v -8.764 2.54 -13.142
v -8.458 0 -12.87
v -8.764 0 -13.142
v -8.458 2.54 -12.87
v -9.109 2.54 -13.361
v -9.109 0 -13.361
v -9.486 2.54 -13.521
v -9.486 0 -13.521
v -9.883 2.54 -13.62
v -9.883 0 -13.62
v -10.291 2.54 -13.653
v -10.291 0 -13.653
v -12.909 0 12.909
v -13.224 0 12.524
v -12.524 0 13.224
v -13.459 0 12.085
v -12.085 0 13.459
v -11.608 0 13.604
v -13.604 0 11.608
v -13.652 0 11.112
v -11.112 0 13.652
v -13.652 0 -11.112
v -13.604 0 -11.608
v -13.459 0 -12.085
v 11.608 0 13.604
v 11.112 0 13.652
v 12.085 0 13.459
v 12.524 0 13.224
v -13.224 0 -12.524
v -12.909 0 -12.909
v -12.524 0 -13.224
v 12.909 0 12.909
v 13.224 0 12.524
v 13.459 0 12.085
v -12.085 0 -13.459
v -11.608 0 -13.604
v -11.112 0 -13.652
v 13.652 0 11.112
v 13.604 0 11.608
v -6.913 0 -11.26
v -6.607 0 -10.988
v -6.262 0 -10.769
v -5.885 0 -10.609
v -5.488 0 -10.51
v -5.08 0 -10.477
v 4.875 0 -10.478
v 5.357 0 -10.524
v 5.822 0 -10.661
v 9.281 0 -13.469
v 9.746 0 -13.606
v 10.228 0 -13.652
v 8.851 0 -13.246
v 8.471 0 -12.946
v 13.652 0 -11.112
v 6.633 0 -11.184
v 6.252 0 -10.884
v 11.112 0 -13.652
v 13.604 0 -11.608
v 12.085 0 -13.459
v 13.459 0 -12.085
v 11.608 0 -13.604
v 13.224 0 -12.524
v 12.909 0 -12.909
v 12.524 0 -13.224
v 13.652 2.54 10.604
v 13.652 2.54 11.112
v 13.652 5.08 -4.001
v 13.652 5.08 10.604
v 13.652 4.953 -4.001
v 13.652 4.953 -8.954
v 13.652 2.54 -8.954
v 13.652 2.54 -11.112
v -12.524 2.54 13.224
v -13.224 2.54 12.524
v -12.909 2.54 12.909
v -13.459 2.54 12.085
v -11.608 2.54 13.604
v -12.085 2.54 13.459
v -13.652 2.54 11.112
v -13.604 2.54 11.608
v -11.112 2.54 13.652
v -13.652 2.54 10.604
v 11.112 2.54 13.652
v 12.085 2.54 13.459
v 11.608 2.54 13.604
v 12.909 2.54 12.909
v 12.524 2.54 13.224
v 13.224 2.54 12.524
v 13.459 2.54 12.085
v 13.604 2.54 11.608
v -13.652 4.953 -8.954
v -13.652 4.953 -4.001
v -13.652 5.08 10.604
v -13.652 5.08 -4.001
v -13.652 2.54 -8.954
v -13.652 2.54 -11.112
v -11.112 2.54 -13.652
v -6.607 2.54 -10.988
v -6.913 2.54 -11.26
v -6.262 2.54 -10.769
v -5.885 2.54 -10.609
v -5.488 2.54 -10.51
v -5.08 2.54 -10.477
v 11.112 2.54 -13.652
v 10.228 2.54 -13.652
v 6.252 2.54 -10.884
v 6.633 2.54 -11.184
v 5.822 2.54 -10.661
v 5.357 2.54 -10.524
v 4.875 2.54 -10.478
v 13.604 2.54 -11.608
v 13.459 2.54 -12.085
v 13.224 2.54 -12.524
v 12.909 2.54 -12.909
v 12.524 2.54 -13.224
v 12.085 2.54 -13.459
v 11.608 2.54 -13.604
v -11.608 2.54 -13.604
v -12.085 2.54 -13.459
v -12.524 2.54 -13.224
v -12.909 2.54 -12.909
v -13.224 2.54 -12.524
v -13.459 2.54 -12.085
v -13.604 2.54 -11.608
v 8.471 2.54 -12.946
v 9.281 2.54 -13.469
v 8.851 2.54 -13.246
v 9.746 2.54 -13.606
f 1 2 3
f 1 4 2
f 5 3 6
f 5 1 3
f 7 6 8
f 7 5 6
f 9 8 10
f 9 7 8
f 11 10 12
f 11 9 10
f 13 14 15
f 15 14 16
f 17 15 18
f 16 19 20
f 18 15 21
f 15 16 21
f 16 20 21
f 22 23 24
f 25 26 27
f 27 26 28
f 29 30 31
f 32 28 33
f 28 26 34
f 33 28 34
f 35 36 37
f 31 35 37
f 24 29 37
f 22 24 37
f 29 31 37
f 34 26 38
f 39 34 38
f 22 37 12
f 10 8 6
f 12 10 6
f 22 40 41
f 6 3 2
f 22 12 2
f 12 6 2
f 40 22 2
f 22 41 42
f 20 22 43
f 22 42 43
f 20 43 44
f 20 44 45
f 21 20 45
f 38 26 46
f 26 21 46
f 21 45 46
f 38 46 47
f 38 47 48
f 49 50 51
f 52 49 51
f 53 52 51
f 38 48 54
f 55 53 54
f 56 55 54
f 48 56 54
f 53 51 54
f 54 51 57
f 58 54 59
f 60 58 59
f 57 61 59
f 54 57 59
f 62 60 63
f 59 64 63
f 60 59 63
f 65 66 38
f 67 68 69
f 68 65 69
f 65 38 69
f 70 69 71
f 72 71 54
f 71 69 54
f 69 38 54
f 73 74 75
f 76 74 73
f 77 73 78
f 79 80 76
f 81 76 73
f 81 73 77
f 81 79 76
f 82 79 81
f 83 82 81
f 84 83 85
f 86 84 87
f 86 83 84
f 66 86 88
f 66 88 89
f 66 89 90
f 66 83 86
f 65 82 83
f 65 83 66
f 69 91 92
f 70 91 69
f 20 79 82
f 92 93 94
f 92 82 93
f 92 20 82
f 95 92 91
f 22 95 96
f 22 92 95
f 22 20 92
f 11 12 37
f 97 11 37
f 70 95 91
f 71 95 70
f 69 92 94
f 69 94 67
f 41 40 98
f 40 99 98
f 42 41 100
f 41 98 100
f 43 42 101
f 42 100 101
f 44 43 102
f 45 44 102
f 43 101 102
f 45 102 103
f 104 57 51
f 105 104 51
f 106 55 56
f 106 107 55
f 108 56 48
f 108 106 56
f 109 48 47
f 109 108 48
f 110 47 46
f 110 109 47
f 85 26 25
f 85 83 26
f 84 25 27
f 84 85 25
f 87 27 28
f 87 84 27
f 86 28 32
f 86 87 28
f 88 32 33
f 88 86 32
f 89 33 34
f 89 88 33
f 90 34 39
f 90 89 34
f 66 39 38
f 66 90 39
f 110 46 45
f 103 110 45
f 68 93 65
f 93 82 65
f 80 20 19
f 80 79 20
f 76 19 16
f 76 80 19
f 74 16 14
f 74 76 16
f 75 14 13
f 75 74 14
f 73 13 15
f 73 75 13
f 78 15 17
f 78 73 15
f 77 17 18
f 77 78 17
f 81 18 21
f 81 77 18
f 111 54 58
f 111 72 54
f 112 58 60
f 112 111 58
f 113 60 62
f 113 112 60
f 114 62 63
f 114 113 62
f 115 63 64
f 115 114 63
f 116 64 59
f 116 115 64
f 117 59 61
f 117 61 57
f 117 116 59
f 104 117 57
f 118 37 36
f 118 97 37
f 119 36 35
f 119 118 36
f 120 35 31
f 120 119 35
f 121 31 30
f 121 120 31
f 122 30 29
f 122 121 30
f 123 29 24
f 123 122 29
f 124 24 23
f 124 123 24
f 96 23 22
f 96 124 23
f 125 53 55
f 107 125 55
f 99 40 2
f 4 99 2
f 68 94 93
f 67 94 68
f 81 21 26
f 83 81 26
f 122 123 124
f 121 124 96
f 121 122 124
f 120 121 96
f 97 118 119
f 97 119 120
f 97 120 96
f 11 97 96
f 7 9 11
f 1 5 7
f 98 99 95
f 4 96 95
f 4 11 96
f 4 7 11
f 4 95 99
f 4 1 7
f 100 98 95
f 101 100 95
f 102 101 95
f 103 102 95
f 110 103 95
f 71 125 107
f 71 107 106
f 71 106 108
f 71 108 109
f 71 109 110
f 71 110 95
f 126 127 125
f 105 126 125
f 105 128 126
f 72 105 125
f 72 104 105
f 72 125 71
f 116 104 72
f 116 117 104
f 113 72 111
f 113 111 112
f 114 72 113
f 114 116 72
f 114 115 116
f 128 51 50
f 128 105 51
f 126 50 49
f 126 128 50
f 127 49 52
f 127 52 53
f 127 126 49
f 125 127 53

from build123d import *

# Parameters (mm, degrees)
BOSS_EXTRUDE1_DEPTH = 2.54
FILLET1_R           = 2.54
SKETCH2_W           = 27.305
SKETCH2_H           = 19.558
BOSS_EXTRUDE2_DEPTH = 2.413
SKETCH3_W           = 27.305
SKETCH3_H           = 14.605
BOSS_EXTRUDE3_DEPTH = 0.127


with BuildPart() as part:
    # Sketch1 → Boss-Extrude1 (new body)
    with BuildSketch(Plane(origin=(0, 0, 0), x_dir=(1, 0, 0), z_dir=(0, 1, 0))):
        Polygon((-6.163592518, 10.4775), (-9.2075, 13.6525), (-13.6525, 13.6525), (-13.6525, -13.6525), (13.6525, -13.6525), (13.6525, 13.6525), (9.2075, 13.6525), (5.895761697, 10.4775), align=None)
    extrude(amount=BOSS_EXTRUDE1_DEPTH)

    # Fillet1
    fillet1_edges = [part.edges().sort_by_distance(p)[0] for p in [
        (9.2075, 1.27, -13.6525),
        (13.6525, 1.27, -13.6525),
        (13.6525, 1.27, 13.6525),
        (-13.6525, 1.27, 13.6525),
        (-13.6525, 1.27, -13.6525),
        (-9.2075, 1.27, -13.6525),
        (-6.163592518, 1.27, -10.4775),
        (5.895761697, 1.27, -10.4775),
    ]]
    fillet(fillet1_edges, radius=FILLET1_R)

    # Sketch2 → Boss-Extrude2 (add)
    with BuildSketch(Plane(origin=(0, 2.54, 0), x_dir=(1, 0, 0), z_dir=(0, 1, 0))):
        with Locations((0, -0.8255)):
            Rectangle(SKETCH2_W, SKETCH2_H)
    extrude(amount=BOSS_EXTRUDE2_DEPTH)

    # Sketch3 → Boss-Extrude3 (add)
    with BuildSketch(Plane(origin=(0, 4.953, 0), x_dir=(1, 0, 0), z_dir=(0, 1, 0))):
        with Locations((0, -3.302)):
            Rectangle(SKETCH3_W, SKETCH3_H)
    extrude(amount=BOSS_EXTRUDE3_DEPTH)


solid = part.part
